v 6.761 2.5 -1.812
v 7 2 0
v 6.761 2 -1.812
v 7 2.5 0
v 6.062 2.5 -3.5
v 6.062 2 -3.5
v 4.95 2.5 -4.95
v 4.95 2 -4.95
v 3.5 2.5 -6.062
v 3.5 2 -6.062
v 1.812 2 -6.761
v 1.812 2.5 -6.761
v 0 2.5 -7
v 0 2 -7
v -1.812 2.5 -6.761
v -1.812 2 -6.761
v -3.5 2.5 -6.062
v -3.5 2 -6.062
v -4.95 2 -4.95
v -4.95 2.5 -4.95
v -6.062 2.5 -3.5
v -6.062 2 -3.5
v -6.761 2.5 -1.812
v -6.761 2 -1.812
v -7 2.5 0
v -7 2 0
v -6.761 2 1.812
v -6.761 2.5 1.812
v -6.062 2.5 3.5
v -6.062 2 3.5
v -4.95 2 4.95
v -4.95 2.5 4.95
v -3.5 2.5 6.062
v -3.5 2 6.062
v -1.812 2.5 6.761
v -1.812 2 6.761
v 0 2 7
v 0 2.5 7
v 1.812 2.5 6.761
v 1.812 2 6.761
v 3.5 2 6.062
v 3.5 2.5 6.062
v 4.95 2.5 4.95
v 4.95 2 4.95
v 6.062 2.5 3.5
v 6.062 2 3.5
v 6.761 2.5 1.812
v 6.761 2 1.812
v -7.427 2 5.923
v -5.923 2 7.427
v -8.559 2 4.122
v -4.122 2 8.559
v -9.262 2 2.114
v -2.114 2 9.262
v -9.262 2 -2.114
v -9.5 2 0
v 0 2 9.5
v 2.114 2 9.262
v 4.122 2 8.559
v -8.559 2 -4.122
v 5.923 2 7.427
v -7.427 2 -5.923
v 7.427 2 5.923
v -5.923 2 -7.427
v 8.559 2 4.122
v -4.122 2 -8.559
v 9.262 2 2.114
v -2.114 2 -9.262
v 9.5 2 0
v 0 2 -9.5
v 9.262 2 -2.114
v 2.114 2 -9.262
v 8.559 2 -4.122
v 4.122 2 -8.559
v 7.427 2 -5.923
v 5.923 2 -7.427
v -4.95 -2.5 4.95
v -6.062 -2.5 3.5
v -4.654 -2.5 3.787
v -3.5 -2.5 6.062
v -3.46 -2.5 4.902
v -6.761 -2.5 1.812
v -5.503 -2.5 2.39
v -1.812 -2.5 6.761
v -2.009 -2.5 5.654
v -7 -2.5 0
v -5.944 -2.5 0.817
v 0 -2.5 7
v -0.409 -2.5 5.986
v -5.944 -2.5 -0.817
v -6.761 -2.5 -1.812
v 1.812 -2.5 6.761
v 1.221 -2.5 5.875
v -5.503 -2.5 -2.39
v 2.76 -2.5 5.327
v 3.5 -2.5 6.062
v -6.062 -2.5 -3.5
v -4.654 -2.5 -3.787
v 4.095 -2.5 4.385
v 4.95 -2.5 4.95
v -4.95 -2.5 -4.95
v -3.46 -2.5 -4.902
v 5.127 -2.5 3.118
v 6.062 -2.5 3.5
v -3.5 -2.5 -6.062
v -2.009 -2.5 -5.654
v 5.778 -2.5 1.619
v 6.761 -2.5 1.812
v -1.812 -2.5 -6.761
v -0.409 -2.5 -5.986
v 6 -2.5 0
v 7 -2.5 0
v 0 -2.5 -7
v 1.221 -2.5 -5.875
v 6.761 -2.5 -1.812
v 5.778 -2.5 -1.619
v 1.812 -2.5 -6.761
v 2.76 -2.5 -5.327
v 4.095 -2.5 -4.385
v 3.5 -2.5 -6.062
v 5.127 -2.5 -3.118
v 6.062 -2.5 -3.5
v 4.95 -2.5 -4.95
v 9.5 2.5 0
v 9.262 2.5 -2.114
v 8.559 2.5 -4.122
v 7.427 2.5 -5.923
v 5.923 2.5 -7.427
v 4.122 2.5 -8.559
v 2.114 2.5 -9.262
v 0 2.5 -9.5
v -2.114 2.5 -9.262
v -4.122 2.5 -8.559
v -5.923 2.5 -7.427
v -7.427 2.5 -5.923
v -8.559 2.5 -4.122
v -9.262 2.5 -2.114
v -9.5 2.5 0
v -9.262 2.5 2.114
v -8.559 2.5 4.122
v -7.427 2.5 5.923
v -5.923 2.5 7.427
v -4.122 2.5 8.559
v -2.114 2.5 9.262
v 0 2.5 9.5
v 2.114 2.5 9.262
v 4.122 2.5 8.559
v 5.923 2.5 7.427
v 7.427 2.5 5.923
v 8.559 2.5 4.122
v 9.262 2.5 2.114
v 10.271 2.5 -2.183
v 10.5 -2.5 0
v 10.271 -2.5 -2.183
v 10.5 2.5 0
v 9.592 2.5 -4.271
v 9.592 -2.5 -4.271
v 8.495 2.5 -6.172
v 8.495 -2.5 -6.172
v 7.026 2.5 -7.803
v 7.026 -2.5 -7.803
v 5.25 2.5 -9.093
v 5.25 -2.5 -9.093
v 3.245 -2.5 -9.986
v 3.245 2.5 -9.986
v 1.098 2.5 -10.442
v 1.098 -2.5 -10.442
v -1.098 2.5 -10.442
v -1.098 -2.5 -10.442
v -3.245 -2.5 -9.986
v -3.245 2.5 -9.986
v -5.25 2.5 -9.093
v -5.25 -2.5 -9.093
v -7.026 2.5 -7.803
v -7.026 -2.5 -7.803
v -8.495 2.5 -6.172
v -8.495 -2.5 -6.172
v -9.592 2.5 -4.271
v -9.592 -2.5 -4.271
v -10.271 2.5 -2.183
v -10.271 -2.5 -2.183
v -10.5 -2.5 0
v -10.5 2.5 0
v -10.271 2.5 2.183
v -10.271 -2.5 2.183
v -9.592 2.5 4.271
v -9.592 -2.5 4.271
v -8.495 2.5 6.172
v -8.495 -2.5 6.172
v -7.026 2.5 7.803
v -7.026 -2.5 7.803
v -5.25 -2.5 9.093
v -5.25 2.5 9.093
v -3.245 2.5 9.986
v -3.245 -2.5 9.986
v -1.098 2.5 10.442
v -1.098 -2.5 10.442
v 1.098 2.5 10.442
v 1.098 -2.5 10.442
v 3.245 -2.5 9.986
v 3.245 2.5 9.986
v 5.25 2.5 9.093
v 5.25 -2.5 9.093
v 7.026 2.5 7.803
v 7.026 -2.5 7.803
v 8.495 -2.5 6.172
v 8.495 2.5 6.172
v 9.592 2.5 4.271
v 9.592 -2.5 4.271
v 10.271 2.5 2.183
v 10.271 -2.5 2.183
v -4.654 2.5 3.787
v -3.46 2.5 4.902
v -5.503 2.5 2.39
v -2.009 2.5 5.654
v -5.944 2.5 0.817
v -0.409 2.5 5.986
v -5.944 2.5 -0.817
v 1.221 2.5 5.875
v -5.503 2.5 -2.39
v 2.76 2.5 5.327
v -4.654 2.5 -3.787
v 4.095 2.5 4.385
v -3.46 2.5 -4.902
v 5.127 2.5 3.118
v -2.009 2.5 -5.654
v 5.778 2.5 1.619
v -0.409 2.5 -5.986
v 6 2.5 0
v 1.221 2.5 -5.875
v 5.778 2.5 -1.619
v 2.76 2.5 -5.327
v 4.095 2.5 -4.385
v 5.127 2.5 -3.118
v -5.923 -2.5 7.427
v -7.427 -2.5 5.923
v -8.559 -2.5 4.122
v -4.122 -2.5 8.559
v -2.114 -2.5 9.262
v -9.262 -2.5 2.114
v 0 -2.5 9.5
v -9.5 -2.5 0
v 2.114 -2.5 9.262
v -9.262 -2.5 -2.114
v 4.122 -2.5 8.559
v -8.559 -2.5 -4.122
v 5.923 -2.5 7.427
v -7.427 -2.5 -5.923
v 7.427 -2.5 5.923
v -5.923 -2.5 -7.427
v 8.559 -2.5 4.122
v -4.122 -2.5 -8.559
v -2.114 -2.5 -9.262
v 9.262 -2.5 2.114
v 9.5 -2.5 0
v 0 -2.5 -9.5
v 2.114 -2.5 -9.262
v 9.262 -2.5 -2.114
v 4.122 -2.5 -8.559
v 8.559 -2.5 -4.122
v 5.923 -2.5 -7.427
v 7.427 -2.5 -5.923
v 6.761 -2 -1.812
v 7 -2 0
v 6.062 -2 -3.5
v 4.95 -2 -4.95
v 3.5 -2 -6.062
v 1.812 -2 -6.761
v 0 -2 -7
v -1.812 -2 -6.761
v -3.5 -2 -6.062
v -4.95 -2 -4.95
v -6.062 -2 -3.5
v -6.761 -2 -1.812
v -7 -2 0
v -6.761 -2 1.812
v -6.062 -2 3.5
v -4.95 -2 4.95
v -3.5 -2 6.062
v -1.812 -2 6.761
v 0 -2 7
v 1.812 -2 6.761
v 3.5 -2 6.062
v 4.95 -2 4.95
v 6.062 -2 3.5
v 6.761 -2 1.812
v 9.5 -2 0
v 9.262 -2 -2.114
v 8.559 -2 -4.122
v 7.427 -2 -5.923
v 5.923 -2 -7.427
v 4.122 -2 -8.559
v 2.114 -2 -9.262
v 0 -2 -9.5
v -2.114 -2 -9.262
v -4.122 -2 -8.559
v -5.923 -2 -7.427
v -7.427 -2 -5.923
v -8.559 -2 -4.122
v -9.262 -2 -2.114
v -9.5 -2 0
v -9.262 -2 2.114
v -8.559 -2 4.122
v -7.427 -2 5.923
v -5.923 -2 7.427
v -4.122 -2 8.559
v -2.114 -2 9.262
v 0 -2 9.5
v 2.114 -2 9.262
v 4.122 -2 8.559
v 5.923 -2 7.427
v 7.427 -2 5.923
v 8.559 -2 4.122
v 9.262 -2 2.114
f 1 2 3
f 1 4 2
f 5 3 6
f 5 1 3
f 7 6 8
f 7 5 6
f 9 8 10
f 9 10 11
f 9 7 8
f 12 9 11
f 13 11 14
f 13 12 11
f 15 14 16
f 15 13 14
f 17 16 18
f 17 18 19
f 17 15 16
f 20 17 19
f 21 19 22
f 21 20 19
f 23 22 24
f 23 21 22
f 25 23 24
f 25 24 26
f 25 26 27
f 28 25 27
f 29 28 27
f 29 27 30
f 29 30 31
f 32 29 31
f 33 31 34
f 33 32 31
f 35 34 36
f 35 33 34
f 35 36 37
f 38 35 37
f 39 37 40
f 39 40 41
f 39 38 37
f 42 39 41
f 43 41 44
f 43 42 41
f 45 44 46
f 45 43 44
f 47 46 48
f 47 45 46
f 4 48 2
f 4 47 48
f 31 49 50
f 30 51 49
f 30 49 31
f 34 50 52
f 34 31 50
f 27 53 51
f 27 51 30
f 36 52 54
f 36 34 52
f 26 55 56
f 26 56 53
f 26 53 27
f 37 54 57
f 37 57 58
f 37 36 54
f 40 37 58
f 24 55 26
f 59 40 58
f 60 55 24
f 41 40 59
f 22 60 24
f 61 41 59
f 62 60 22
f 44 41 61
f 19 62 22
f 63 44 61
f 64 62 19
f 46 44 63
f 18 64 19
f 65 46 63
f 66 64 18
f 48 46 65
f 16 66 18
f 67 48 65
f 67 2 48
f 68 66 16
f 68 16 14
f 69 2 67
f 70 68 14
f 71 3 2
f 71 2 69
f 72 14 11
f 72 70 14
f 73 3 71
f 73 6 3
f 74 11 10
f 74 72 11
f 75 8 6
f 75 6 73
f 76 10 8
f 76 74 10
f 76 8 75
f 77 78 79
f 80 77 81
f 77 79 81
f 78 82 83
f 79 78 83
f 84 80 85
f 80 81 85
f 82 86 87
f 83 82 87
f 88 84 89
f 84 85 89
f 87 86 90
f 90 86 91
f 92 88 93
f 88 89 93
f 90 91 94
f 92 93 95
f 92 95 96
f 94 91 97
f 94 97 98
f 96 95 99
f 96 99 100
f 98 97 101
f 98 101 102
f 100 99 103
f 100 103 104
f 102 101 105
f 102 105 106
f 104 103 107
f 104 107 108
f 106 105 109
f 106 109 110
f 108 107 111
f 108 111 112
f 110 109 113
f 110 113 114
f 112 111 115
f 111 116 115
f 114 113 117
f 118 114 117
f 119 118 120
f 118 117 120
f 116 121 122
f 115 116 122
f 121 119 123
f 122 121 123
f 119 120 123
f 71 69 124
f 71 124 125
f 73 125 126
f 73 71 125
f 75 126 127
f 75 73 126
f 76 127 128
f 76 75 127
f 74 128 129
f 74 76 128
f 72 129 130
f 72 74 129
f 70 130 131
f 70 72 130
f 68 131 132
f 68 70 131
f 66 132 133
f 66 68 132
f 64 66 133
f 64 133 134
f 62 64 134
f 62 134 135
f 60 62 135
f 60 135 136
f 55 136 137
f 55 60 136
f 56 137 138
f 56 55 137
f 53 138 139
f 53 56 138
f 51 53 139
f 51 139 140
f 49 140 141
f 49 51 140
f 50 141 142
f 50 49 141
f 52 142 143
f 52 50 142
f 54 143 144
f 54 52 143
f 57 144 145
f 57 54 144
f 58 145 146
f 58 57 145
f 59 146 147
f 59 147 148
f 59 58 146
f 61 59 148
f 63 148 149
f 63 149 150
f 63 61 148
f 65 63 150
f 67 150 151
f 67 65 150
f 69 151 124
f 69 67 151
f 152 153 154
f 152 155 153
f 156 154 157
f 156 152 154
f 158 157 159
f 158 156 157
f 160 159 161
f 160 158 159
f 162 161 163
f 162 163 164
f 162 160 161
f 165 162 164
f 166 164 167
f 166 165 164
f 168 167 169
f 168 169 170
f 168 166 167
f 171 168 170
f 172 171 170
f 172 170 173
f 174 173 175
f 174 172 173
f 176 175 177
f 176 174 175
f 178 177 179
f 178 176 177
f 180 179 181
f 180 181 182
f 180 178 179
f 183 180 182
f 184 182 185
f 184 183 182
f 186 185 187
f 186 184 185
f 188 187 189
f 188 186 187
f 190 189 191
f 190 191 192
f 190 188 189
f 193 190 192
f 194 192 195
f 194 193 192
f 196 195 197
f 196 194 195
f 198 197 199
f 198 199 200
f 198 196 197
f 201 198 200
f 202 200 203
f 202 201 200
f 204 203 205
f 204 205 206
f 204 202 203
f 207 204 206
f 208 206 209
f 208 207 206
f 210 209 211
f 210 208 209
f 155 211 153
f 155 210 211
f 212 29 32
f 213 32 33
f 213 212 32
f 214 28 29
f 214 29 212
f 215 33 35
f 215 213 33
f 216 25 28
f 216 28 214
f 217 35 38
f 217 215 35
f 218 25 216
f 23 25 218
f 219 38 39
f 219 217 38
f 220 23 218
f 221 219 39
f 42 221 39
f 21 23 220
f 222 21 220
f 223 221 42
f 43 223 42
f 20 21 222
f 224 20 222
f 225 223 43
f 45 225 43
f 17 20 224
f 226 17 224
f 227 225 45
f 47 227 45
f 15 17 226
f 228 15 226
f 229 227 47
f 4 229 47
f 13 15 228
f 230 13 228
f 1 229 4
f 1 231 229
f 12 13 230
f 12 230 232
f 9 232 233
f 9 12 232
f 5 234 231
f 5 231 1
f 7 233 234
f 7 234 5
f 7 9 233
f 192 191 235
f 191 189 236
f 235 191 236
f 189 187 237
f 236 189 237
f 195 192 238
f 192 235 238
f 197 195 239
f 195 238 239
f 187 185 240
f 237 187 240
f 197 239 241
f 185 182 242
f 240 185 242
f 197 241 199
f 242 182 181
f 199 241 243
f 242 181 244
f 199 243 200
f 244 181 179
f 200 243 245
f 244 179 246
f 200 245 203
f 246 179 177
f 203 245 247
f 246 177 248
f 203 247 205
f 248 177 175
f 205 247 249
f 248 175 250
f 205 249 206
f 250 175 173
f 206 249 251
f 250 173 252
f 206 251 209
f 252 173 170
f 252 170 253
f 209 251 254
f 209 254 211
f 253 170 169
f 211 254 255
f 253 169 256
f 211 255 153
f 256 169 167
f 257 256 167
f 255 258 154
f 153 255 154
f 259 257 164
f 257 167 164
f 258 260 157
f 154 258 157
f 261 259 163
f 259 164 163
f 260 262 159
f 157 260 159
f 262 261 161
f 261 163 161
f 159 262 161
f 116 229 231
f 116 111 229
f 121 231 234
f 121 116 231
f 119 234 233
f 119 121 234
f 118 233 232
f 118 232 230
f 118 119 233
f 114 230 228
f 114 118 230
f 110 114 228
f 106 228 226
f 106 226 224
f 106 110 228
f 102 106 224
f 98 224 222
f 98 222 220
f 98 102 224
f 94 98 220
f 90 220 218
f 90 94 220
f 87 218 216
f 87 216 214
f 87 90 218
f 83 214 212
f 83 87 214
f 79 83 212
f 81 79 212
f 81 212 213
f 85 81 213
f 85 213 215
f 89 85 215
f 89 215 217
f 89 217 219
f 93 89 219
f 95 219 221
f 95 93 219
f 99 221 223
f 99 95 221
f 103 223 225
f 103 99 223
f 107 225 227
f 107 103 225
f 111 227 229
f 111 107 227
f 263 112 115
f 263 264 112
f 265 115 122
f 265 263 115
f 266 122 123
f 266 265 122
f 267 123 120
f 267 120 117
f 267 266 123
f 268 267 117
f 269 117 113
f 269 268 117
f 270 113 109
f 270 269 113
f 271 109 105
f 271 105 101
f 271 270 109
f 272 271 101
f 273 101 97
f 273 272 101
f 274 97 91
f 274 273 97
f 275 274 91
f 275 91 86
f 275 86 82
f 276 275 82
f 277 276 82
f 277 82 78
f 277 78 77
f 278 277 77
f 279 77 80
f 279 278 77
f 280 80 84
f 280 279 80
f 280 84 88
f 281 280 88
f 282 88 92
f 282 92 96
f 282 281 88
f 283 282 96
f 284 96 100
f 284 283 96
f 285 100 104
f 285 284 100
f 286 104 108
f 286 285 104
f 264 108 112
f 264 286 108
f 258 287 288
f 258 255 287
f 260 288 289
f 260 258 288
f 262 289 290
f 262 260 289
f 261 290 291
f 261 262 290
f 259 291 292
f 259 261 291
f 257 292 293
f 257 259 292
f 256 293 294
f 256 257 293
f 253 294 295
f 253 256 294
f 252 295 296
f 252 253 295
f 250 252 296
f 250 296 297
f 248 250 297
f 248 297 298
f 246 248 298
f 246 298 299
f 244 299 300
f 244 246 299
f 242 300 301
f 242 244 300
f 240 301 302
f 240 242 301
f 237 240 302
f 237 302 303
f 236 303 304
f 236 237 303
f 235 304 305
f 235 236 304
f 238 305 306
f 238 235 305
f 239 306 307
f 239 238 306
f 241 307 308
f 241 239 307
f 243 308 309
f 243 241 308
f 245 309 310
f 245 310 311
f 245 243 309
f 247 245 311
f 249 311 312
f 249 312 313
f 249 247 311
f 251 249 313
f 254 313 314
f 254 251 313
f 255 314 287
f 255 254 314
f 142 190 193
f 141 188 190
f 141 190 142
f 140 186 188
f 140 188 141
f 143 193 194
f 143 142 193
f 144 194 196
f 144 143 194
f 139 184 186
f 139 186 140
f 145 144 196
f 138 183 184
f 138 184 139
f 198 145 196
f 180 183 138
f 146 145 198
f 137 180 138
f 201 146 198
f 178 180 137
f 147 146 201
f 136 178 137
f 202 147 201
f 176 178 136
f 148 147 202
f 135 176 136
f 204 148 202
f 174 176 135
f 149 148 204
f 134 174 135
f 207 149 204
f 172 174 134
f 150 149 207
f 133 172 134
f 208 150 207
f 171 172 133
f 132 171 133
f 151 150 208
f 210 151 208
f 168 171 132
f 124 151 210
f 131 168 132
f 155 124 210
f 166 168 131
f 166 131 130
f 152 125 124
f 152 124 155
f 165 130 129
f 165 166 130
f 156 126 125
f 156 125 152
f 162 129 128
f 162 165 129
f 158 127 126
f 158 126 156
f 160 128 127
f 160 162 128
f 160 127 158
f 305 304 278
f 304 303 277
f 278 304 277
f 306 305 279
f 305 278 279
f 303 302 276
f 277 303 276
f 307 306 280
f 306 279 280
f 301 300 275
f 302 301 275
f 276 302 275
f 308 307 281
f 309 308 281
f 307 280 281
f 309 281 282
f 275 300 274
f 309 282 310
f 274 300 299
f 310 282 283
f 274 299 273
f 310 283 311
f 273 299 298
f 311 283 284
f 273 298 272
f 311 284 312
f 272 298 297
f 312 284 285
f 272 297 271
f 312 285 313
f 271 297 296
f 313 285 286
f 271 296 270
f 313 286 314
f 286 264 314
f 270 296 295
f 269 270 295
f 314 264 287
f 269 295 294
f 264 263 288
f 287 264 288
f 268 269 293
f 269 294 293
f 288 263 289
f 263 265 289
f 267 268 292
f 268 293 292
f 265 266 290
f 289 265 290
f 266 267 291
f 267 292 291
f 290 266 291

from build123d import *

# Parameters (mm, degrees)
BOSS_EXTRU_1_DEPTH        = 2.5
BOSS_EXTRU_1_DEPTH_BACK   = 2.5
ESQUISSE1_R               = 10.5
ESQUISSE1_R_2             = 9.5
BOSS_EXTRU_1_2_DEPTH      = 2.5
BOSS_EXTRU_1_2_DEPTH_BACK = 2.5
ESQUISSE1_R_3             = 7
ESQUISSE1_R_4             = 6
BOSS_EXTRU_2_DEPTH        = 2
BOSS_EXTRU_2_DEPTH_BACK   = 2
ESQUISSE1_3_R             = 9.5
ESQUISSE1_3_R_2           = 7


with BuildPart() as part:
    # Esquisse1 → Boss.-Extru.1 (new, two sides: drawn at the far end of the back side and taken through both)
    with BuildSketch(Plane(origin=(0, 0, 0), x_dir=(1, 0, 0), z_dir=(0, 1, 0)).offset(-BOSS_EXTRU_1_DEPTH_BACK)):
        Circle(ESQUISSE1_R)
        Circle(ESQUISSE1_R_2, mode=Mode.SUBTRACT)
    extrude(amount=BOSS_EXTRU_1_DEPTH + BOSS_EXTRU_1_DEPTH_BACK)



with BuildPart() as body_2:
    # Esquisse1 → Boss.-Extru.1 2 (new, two sides: drawn at the far end of the back side and taken through both)
    with BuildSketch(Plane(origin=(0, 0, 0), x_dir=(1, 0, 0), z_dir=(0, 1, 0)).offset(-BOSS_EXTRU_1_2_DEPTH_BACK)):
        Circle(ESQUISSE1_R_3)
        Circle(ESQUISSE1_R_4, mode=Mode.SUBTRACT)
    extrude(amount=BOSS_EXTRU_1_2_DEPTH + BOSS_EXTRU_1_2_DEPTH_BACK)


with BuildPart() as part_1:
    add(part.part)

    add(body_2.part)  # Boss.-Extru.2 merges body 2
    # Esquisse1<3> → Boss.-Extru.2 (add, two sides: drawn at the far end of the back side and taken through both)
    with BuildSketch(Plane(origin=(0, 0, 0), x_dir=(1, 0, 0), z_dir=(0, 1, 0)).offset(-BOSS_EXTRU_2_DEPTH_BACK)):
        Circle(ESQUISSE1_3_R)
        Circle(ESQUISSE1_3_R_2, mode=Mode.SUBTRACT)
    extrude(amount=BOSS_EXTRU_2_DEPTH + BOSS_EXTRU_2_DEPTH_BACK)


solid = part_1.part
